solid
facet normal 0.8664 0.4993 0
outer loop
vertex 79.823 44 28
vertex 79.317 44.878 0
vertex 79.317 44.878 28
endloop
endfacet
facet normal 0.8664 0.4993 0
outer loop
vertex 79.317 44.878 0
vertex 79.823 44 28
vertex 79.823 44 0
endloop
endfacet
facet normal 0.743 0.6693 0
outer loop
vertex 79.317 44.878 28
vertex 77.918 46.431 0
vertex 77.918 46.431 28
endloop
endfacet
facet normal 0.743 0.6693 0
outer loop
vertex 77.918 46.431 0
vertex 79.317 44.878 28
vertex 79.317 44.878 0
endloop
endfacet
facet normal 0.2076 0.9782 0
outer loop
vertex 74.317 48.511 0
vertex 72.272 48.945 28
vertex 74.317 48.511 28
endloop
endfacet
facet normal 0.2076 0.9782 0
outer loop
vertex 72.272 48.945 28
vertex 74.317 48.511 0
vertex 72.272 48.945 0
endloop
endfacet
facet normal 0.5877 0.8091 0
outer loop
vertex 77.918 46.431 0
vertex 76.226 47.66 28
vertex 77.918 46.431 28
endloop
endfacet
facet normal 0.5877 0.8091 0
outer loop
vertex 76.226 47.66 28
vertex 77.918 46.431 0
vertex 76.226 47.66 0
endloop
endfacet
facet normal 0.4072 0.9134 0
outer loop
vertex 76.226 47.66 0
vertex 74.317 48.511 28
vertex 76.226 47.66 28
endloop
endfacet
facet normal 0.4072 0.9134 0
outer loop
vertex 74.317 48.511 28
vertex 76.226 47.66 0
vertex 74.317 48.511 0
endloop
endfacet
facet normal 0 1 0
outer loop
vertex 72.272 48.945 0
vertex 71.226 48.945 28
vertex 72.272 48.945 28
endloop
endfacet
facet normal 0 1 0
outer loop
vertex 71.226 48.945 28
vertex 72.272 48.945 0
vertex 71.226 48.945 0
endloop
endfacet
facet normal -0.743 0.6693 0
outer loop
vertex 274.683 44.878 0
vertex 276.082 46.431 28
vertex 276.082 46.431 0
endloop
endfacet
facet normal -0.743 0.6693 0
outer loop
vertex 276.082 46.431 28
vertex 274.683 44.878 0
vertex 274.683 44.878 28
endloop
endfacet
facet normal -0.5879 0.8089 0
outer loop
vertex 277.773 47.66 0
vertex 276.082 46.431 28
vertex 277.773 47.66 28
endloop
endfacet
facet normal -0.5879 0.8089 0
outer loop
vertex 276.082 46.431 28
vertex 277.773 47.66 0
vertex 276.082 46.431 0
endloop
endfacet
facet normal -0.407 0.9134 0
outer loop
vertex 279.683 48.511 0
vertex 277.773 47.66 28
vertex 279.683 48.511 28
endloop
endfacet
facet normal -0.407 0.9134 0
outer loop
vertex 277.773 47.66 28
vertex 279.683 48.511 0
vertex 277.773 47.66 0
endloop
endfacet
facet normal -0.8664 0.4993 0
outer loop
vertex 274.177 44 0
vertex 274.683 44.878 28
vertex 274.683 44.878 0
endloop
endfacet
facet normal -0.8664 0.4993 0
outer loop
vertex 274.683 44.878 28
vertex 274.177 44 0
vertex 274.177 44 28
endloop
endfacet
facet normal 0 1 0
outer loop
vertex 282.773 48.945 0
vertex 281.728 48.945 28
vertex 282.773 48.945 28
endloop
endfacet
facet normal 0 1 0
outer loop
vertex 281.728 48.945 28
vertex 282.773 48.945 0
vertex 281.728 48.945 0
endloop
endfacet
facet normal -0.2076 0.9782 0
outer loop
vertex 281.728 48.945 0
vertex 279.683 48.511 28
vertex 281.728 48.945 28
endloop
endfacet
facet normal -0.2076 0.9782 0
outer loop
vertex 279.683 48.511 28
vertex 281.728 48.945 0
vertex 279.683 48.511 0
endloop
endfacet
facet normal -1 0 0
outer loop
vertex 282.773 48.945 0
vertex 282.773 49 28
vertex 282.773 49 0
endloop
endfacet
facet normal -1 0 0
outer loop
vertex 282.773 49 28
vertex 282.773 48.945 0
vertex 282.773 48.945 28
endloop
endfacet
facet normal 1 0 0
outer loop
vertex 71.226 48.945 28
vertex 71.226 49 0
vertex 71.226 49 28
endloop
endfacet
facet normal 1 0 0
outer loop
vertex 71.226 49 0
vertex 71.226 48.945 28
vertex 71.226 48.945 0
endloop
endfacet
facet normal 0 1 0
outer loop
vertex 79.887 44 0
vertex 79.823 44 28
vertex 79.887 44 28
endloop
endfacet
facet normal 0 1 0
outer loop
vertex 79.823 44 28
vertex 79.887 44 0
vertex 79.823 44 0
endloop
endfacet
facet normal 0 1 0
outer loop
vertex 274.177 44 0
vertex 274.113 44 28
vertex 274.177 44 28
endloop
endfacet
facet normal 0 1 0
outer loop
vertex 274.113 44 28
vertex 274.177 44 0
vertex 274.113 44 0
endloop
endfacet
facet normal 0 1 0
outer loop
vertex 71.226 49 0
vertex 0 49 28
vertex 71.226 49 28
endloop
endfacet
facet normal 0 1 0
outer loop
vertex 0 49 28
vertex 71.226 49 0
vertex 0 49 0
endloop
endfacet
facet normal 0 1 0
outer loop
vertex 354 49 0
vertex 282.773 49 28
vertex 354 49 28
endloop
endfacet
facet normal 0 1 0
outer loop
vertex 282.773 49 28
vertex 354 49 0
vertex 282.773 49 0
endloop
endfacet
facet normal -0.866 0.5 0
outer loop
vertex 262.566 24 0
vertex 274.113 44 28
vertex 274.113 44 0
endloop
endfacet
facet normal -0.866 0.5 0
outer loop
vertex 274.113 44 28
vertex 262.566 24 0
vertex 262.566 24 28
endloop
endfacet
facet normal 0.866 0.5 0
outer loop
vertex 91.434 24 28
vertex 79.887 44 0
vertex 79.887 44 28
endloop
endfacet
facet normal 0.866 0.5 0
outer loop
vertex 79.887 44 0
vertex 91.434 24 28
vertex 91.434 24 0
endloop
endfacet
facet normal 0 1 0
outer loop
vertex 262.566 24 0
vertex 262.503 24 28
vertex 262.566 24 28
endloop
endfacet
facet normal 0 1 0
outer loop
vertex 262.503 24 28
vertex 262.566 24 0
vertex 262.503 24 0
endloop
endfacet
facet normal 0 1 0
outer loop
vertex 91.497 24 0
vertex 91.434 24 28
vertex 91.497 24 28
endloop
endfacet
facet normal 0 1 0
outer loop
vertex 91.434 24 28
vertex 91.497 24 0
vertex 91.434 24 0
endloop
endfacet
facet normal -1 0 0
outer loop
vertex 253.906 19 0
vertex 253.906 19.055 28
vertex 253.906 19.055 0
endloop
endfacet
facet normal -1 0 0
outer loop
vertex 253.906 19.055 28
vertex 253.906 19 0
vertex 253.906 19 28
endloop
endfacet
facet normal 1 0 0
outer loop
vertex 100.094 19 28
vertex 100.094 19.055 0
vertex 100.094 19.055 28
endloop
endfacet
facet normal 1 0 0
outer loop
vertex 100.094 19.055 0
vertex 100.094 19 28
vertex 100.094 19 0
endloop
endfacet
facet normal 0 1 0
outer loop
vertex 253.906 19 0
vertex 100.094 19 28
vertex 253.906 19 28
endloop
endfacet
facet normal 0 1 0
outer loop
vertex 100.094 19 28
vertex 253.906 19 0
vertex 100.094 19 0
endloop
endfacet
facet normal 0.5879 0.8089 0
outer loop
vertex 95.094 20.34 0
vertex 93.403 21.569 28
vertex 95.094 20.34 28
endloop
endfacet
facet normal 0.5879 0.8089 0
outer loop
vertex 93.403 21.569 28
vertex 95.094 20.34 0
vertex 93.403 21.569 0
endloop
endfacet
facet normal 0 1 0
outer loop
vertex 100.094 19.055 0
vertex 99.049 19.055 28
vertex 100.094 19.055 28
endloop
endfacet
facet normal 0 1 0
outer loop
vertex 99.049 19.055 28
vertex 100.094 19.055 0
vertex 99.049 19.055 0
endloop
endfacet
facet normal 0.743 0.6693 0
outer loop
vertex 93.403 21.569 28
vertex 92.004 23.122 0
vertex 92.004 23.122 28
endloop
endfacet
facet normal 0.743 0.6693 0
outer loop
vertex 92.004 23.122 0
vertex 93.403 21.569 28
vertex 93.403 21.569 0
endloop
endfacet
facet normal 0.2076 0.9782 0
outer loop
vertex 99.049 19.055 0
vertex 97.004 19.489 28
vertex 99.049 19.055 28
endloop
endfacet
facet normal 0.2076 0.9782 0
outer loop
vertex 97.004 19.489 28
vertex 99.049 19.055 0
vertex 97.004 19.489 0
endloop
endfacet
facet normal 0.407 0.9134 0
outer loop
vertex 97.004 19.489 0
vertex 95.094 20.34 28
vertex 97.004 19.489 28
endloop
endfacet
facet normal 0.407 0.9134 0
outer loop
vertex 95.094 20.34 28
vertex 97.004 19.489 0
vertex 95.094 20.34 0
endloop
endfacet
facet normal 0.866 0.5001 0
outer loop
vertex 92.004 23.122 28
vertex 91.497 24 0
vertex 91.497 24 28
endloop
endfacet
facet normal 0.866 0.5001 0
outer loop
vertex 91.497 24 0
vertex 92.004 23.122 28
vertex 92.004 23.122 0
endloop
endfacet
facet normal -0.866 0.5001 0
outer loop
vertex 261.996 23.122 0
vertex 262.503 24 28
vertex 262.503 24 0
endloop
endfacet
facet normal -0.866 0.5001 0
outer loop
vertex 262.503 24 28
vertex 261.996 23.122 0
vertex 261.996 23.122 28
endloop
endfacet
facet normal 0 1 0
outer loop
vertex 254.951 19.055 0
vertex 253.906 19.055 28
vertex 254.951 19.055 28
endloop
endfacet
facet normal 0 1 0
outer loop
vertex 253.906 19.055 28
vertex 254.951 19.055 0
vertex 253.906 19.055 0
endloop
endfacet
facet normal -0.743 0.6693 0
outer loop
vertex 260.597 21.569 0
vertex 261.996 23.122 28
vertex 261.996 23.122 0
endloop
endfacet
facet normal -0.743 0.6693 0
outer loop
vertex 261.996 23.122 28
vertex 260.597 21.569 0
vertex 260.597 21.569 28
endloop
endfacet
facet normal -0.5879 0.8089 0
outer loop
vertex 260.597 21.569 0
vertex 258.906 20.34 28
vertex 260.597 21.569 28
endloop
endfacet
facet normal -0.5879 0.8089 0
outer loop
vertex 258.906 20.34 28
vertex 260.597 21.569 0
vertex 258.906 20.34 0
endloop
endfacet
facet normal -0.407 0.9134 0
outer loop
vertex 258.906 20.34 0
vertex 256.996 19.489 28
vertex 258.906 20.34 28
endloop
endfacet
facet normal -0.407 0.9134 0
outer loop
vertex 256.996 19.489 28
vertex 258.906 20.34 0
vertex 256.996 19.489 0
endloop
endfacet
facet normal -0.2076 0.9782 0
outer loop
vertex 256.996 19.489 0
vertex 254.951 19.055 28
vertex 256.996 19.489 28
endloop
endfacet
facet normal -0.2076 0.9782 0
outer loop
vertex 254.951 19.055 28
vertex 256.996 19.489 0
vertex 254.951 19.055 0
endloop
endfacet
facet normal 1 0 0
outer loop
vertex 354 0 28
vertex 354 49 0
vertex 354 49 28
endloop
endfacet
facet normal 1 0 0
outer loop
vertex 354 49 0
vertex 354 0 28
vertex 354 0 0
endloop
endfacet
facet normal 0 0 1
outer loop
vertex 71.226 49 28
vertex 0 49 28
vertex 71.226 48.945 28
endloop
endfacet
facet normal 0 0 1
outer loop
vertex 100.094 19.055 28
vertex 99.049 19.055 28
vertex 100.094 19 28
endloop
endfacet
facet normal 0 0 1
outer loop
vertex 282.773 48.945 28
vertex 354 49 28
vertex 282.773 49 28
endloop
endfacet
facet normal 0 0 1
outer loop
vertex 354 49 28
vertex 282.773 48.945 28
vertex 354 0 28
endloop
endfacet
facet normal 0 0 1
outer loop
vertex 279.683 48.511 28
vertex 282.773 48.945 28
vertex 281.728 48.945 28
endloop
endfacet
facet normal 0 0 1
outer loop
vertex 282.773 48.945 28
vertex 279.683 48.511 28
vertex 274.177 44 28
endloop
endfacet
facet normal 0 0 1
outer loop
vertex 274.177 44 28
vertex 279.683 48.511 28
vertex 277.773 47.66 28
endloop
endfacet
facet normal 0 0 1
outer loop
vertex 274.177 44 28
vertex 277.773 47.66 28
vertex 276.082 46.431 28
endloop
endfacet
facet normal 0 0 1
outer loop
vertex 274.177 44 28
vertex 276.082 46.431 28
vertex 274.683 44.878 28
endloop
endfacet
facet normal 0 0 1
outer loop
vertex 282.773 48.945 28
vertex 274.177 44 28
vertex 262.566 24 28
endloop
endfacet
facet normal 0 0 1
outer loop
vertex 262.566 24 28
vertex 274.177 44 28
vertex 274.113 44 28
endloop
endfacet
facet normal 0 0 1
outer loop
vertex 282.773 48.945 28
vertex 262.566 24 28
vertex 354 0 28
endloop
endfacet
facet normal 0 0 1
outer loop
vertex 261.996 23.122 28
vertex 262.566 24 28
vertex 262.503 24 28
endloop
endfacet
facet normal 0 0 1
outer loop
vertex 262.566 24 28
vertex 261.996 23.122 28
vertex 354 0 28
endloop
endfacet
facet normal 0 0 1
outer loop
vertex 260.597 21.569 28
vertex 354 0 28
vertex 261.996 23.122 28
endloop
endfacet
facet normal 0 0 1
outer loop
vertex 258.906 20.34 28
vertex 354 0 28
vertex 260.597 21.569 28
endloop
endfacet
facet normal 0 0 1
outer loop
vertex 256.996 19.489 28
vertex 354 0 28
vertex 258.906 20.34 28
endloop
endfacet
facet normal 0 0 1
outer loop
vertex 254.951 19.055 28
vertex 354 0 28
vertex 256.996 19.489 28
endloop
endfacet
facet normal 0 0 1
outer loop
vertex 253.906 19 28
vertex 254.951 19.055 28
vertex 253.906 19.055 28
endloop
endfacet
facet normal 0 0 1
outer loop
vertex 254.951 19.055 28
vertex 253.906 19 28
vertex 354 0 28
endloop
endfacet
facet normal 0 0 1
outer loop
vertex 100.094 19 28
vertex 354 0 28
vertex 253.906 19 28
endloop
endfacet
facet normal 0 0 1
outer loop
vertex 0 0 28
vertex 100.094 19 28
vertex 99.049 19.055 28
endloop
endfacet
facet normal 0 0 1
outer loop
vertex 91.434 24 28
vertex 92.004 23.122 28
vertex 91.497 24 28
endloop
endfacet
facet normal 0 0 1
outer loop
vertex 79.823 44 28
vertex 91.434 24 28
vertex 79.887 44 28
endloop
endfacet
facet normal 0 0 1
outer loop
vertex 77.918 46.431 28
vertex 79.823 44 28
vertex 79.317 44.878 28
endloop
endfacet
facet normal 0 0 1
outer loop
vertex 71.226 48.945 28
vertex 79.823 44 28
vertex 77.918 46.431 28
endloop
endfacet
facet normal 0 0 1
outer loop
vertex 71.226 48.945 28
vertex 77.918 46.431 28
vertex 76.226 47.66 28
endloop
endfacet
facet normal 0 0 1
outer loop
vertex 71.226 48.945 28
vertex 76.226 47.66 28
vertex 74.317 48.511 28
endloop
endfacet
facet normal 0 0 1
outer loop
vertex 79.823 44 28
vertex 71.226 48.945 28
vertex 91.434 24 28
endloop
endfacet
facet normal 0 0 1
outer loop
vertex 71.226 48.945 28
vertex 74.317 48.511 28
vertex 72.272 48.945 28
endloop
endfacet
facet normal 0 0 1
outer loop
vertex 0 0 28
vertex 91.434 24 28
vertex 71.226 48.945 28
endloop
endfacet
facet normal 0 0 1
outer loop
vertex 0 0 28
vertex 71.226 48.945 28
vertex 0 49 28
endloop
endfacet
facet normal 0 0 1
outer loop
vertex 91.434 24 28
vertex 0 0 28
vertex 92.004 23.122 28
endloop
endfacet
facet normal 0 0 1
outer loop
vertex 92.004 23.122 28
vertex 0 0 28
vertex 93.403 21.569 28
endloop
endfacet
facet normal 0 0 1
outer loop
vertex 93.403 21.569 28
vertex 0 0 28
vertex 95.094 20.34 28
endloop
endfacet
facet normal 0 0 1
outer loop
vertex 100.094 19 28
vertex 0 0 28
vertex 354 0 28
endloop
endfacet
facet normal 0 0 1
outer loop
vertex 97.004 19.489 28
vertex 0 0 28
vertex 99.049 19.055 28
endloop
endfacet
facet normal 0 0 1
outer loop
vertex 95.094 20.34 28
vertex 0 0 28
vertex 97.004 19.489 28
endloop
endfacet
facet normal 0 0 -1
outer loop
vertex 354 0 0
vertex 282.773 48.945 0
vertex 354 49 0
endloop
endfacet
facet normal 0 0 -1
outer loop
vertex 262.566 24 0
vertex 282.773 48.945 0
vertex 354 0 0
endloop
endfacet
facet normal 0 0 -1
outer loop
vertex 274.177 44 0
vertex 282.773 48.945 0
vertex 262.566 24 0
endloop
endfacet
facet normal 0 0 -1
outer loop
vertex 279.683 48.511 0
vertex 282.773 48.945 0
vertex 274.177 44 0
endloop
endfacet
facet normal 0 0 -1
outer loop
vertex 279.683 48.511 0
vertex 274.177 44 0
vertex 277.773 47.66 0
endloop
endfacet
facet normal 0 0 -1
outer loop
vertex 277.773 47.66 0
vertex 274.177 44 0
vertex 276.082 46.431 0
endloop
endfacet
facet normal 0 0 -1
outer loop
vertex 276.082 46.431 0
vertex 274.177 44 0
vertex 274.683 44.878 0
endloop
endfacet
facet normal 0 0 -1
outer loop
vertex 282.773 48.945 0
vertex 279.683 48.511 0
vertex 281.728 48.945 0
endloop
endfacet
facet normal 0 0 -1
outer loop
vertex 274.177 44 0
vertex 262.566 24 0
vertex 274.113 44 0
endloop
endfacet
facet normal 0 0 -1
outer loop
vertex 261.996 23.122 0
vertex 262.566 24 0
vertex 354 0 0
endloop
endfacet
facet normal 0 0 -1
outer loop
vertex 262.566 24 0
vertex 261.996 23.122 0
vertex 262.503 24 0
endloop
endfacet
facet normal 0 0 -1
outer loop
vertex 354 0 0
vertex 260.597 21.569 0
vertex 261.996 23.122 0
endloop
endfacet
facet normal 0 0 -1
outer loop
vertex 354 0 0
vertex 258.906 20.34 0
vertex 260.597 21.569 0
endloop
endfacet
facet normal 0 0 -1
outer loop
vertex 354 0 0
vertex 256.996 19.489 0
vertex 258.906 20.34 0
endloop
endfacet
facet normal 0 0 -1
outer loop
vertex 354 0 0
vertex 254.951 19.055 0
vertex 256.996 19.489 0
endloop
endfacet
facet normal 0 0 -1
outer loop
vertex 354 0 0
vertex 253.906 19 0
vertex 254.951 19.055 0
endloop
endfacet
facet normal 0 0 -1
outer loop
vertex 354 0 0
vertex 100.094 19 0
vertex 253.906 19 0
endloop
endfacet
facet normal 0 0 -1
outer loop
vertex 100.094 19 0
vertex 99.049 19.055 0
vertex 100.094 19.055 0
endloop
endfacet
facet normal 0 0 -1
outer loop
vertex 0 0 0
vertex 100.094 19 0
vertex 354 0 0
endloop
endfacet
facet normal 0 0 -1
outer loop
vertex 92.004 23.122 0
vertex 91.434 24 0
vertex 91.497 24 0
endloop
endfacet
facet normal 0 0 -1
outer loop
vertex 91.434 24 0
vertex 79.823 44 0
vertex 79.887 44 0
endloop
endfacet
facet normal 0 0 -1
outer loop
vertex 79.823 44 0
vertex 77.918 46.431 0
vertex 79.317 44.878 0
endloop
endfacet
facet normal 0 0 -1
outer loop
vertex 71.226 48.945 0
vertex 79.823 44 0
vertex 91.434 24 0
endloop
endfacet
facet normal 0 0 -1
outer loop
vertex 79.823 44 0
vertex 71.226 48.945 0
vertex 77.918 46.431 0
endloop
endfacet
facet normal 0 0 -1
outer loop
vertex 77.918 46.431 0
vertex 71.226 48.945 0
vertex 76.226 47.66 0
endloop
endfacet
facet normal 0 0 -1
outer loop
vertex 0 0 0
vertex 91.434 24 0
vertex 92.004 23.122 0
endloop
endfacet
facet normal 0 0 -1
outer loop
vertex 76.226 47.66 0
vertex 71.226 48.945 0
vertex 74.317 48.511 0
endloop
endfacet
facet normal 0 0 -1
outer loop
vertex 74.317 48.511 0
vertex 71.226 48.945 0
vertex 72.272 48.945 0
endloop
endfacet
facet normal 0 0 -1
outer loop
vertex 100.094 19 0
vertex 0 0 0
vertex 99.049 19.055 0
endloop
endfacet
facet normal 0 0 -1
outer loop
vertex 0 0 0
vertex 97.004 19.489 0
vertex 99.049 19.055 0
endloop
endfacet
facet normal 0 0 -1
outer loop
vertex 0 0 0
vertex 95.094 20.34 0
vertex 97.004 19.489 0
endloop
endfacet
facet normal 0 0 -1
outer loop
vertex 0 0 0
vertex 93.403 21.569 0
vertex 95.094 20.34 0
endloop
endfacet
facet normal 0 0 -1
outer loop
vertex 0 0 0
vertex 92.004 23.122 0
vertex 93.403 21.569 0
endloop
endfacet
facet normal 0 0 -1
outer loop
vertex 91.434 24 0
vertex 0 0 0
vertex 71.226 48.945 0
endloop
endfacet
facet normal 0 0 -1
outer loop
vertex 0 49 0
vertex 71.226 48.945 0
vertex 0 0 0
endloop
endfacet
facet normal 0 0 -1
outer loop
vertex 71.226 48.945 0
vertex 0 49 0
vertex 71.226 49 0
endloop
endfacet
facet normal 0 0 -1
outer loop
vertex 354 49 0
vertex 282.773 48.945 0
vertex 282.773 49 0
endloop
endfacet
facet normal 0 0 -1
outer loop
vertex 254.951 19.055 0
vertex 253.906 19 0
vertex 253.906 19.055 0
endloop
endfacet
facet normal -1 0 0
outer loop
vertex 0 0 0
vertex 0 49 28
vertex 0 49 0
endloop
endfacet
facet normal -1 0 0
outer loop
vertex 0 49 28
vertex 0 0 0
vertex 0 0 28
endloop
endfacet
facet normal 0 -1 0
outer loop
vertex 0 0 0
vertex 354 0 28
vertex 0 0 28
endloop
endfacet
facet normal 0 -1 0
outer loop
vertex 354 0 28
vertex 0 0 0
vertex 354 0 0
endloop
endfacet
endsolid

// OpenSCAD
include <../src/wardrobe.scad>;
plank_yz_middle_bottom();
//github_openscad -o wardrobe_1/plank_yz_middle_bottom.stl -D wardrobe_n=1 -D cutting_edge=0 -D break_view_length=0 wardrobe_1/plank_yz_middle_bottom_stl.scad
